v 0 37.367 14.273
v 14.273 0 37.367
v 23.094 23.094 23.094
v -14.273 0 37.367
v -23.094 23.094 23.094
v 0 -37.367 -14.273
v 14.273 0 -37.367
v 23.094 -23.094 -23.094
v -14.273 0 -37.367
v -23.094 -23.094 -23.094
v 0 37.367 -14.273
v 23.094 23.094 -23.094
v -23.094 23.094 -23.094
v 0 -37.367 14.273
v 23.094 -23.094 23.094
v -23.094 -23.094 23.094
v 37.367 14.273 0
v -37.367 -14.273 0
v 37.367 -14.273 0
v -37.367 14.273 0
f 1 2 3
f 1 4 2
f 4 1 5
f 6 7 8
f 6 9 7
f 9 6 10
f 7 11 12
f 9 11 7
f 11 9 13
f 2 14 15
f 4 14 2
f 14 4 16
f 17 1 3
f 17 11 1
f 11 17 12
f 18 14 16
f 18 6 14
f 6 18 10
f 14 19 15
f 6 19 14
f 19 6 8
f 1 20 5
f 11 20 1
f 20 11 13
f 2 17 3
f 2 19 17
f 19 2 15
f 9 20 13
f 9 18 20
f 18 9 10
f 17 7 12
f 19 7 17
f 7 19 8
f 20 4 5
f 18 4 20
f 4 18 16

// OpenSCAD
// --- PARAMETERS ---
size = 40;          // Distance from center to the vertices (Circumradius)
phi = (1 + sqrt(5)) / 2; // The Golden Ratio (~1.618)

// ---------------------------------------------------------------------
// Helper Module: Slab
// Creates a large block centered and rotated perpendicular to a vector
module slab(s, vector) {
    v = vector / norm(vector);
    
    // The distance from the center to the face of a regular dodecahedron
    // relative to its circumradius is approximately 0.79465
    face_dist = s * sqrt((5 + 2 * sqrt(5)) / 15);
    
    // Calculate rotation to align Z-axis with the target vector
    a = acos(v[2]);
    rot_axis = cross([0, 0, 1], v);

    rotate(a, rot_axis)
        cube([s*4, s*4, face_dist * 2], center=true);
}

// ---------------------------------------------------------------------
// Main Module: Solid Dodecahedron
module dodecahedron_solid(s = size) {
    // A regular dodecahedron is the intersection of 6 slabs 
    // oriented toward the 12 vertices of an icosahedron (6 pairs).
    intersection() {
        slab(s, [0, 1, phi]);
        slab(s, [0, 1, -phi]);
        slab(s, [1, phi, 0]);
        slab(s, [1, -phi, 0]);
        slab(s, [phi, 0, 1]);
        slab(s, [phi, 0, -1]);
    }
}

// Render the solid geometry
color("Goldenrod") dodecahedron_solid(size);
